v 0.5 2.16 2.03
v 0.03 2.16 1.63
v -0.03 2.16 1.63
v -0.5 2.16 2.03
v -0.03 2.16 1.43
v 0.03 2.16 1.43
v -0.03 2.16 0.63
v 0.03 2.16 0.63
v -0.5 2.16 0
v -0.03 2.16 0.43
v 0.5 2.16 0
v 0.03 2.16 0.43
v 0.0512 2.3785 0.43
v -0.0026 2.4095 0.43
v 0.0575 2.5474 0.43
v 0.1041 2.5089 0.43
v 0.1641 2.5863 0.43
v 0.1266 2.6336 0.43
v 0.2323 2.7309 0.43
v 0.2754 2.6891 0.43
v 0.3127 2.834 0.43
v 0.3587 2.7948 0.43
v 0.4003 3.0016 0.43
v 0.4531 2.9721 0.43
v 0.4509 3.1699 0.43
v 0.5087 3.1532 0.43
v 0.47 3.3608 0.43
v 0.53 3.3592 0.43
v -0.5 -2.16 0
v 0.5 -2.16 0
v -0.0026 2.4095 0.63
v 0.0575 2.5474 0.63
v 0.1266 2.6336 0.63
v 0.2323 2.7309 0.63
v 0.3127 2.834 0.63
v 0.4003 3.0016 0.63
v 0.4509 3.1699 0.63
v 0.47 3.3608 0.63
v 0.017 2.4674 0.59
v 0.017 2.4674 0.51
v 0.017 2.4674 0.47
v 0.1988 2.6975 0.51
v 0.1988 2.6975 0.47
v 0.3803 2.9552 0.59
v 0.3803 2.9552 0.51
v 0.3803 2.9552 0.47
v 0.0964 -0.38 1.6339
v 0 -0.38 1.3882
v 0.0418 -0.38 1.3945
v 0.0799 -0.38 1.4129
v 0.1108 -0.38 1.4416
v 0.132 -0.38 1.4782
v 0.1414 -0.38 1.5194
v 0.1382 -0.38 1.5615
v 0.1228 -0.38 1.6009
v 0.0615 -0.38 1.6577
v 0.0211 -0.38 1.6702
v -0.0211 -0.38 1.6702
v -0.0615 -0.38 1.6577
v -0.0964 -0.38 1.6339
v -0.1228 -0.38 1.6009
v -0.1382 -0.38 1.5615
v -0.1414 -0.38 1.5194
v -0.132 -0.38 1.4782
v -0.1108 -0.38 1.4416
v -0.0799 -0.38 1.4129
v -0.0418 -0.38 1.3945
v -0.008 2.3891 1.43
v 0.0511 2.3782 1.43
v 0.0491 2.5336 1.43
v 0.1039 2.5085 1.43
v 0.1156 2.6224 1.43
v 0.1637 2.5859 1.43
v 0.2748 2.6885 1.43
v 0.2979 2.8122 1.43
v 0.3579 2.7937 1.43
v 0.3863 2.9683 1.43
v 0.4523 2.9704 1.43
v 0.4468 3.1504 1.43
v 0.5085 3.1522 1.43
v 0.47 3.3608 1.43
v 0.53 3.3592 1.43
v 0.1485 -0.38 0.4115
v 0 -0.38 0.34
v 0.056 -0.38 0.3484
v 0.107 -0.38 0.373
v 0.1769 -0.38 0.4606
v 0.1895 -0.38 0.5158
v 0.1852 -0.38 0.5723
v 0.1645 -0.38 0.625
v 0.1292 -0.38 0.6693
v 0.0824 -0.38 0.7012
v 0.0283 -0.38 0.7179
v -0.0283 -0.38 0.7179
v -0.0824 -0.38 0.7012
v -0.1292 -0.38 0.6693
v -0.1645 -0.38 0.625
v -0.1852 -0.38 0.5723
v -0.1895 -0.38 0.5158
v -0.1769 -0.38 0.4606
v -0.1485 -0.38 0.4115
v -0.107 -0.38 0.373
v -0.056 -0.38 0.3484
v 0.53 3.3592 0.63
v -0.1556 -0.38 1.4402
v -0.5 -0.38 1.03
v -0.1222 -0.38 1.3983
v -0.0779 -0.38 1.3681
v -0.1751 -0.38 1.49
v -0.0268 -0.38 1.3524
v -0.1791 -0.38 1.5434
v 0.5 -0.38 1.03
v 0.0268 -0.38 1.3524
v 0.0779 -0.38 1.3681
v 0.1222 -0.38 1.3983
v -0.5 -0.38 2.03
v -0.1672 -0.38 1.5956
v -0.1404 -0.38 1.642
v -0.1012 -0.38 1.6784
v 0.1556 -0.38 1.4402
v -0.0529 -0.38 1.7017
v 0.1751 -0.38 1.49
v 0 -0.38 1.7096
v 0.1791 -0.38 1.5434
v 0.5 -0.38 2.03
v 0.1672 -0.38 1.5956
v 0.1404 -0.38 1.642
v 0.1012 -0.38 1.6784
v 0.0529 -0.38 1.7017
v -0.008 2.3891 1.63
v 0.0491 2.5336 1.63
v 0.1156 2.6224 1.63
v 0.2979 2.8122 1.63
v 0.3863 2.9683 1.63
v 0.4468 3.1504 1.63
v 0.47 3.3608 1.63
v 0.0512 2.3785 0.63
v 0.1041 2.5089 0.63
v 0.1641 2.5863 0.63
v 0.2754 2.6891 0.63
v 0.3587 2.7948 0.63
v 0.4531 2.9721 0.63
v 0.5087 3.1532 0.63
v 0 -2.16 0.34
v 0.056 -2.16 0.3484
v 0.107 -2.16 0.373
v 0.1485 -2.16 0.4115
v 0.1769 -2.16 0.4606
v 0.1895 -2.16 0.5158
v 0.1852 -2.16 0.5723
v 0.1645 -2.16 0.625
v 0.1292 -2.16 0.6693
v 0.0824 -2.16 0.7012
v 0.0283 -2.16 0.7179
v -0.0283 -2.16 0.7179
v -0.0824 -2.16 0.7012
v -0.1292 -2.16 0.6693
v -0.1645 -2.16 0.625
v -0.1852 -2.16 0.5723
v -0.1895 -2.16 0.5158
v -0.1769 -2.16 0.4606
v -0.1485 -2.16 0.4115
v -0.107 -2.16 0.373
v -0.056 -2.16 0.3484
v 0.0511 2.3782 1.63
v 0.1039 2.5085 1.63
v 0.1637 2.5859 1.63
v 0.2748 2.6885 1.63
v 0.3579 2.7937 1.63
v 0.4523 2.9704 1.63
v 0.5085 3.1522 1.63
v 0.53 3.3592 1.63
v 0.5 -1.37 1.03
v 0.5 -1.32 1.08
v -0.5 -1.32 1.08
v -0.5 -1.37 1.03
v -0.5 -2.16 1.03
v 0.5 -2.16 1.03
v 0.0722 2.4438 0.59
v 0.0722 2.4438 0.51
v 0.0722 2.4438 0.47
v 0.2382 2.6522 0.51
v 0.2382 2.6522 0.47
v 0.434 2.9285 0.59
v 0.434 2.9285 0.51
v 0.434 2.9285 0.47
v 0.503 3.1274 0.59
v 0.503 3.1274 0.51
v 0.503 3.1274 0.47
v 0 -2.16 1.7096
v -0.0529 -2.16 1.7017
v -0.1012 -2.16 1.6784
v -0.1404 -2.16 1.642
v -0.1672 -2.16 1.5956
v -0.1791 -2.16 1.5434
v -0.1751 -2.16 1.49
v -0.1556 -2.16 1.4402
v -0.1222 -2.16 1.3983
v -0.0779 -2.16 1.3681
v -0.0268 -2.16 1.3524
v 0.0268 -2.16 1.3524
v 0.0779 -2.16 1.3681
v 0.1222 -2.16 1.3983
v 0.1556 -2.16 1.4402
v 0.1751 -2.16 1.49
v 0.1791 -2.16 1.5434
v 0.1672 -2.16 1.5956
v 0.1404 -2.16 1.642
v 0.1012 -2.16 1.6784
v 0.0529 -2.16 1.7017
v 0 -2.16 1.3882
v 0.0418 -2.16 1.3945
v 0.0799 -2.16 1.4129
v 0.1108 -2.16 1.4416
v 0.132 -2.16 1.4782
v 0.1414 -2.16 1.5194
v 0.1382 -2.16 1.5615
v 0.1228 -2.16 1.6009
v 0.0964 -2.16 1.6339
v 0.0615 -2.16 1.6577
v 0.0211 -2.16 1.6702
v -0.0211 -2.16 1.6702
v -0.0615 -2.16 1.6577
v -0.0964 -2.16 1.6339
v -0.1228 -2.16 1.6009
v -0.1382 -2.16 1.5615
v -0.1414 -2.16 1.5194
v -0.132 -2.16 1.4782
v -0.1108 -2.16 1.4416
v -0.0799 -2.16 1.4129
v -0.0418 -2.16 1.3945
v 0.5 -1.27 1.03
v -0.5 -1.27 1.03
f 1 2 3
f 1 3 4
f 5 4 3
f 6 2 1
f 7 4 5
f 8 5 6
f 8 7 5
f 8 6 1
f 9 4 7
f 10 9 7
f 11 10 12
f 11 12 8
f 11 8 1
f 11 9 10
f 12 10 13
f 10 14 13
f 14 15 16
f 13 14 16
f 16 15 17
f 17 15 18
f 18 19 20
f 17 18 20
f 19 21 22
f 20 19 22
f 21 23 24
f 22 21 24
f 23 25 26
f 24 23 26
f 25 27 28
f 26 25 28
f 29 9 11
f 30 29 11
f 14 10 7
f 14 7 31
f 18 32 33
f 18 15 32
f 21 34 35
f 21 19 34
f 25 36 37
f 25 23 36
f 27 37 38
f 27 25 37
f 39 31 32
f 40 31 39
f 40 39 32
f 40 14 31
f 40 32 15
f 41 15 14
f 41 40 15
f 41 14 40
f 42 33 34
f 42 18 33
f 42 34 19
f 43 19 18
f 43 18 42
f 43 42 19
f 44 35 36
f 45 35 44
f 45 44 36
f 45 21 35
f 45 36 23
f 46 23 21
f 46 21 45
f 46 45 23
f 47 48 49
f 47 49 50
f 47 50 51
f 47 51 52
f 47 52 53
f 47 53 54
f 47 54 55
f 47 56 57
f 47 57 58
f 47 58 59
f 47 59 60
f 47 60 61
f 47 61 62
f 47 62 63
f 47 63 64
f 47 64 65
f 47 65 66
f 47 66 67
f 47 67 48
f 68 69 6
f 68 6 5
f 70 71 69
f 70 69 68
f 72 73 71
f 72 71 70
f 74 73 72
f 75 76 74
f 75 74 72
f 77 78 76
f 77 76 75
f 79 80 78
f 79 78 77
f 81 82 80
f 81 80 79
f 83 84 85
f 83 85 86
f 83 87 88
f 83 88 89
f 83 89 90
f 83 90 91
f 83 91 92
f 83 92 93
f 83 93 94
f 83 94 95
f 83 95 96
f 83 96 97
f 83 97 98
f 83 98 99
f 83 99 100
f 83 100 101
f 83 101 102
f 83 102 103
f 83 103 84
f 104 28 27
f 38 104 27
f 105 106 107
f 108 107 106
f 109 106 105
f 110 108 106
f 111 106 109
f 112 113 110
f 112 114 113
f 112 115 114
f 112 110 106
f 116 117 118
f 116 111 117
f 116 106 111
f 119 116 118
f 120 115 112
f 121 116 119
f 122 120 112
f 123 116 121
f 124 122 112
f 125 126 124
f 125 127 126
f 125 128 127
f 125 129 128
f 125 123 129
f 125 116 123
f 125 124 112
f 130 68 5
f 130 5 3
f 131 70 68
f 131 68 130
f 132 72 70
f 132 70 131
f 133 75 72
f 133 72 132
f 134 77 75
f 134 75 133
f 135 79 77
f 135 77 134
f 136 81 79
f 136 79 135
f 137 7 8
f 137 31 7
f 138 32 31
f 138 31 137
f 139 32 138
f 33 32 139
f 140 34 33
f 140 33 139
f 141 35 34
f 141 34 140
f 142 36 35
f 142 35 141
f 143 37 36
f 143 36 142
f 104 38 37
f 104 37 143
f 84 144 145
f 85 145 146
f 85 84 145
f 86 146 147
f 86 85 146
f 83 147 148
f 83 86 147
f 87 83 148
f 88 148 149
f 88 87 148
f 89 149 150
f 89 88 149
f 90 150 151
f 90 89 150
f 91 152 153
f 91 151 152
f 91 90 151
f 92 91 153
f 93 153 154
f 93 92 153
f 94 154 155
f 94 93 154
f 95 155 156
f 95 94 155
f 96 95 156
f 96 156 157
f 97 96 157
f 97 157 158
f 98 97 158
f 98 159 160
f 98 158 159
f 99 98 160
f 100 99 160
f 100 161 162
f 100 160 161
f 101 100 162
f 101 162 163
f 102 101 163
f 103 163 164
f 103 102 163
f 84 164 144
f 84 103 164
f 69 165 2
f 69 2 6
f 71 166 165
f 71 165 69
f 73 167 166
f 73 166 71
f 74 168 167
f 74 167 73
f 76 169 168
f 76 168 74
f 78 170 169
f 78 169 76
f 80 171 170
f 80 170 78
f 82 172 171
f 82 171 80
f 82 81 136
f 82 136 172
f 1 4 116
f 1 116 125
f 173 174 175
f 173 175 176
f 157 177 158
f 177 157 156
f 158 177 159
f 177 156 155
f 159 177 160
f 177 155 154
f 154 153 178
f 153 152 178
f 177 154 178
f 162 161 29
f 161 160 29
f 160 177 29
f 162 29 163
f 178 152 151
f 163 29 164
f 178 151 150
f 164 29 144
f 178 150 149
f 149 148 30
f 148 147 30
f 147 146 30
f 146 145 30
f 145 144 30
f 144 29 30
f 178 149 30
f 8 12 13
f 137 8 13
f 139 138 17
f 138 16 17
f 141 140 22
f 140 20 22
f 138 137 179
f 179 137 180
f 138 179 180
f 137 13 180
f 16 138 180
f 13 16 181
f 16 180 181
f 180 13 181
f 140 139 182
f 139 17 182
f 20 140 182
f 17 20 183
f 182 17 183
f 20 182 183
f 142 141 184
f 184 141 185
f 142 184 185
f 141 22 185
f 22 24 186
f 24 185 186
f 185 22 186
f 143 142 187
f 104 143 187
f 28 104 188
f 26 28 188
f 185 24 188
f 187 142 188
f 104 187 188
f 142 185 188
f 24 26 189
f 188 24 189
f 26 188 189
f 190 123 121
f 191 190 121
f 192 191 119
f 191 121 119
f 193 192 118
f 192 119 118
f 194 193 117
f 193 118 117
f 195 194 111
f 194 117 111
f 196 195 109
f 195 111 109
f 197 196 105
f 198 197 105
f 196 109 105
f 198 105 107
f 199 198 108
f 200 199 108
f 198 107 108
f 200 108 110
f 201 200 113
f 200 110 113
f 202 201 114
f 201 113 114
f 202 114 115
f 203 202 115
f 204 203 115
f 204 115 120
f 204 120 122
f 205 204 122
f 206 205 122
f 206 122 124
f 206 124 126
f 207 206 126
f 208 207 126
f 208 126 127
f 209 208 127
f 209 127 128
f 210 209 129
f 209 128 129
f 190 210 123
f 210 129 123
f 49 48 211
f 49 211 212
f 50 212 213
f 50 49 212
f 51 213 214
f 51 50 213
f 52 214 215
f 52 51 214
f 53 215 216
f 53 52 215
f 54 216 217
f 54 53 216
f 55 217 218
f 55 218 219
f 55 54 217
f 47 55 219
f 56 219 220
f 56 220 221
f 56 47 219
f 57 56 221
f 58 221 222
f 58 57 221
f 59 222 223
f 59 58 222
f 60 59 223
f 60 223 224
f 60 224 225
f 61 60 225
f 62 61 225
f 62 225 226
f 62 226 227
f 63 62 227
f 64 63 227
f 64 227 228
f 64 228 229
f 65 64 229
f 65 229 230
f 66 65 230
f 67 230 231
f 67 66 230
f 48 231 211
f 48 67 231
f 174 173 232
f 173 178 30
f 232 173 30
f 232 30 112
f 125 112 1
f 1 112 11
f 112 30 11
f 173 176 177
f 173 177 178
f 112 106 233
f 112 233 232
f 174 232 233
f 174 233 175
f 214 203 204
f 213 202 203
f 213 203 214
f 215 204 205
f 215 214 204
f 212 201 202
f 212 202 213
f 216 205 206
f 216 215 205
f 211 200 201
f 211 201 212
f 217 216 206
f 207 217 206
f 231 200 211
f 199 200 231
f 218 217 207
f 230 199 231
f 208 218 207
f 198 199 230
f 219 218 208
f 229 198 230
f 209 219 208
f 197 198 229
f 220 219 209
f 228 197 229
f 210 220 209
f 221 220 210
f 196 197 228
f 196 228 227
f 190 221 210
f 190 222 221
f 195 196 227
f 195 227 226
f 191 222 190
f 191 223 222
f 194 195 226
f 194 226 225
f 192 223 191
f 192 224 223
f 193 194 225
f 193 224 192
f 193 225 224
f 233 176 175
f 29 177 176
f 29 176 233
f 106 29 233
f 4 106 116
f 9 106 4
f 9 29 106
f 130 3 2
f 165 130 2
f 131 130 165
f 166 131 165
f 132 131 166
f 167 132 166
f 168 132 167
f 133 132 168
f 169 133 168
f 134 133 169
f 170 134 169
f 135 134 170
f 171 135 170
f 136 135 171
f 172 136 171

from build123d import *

# Parameters (mm, degrees)
SKETCH1_W           = 1
SKETCH1_H           = 4.32
BOSS_EXTRUDE1_DEPTH = 2.03
SKETCH2_W           = 1
SKETCH2_H           = 1.78
CUT_EXTRUDE1_DEPTH  = 1
SKETCH3_R           = 0.179640036
SKETCH3_R_2         = 0.141754664
BOSS_EXTRUDE2_DEPTH = 1.78
SKETCH3_3_R         = 0.19
CUT_EXTRUDE2_DEPTH  = 4.28975683
SKETCH7_W           = 0.06
SKETCH7_H           = 0.2
MIRROR1_START       = 0.43
MIRROR1_DEPTH       = 0.2
BOSS_EXTRUDE3_DEPTH = 1


with BuildPart() as part:
    # Sketch1 → Boss-Extrude1 (new body)
    with BuildSketch(Plane.XY):
        Rectangle(SKETCH1_W, SKETCH1_H)
    extrude(amount=BOSS_EXTRUDE1_DEPTH)

    # Sketch2 → Cut-Extrude1 (cut)
    with BuildSketch(Plane.XY.offset(2.03)):
        with Locations((0, -1.27)):
            Rectangle(SKETCH2_W, SKETCH2_H)
    extrude(amount=-CUT_EXTRUDE1_DEPTH, mode=Mode.SUBTRACT)

    # Sketch3 → Boss-Extrude2 (add)
    with BuildSketch(Plane.XZ.offset(0.38)):
        with Locations(Location((0, 1.53, 0), (0, 0, 90))):
            Circle(SKETCH3_R)
        with Locations(Location((0, 1.53, 0), (0, 0, 270))):
            Circle(SKETCH3_R_2, mode=Mode.SUBTRACT)
    extrude(amount=BOSS_EXTRUDE2_DEPTH)

    # Sketch3<3> → Cut-Extrude2 (cut, through all)
    with BuildSketch(Plane.XZ.offset(0.38)):
        with Locations(Location((0, 0.53, 0), (0, 0, 270))):
            Circle(SKETCH3_3_R)
    extrude(amount=CUT_EXTRUDE2_DEPTH, mode=Mode.SUBTRACT)

    # Sweep2: sweep along a path in Sketch6
    with BuildLine() as sweep2_path:  # in the path sketch's own coordinates; laid on its plane below (add() does not lay a ready-made edge on the line's plane)
        add(Edge.make_bspline(
            [(0, 2.16), (0.006618512, 2.413579092), (-0.099153844, 2.580707218), (-0.318669183, 2.747242888), (-0.5, 3.04153675), (-0.5, 3.36)],
            knots=[0, 0, 0, 0, 0.33988837, 0.43988837, 1, 1, 1, 1], degree=3))
    # Sketch7 → Sweep2 (sweep)
    with BuildSketch(Plane(origin=(0, 2.16, 0), x_dir=(1, 0, 0), z_dir=(0, 1, 0))):
        with Locations((0, -1.53)):
            Rectangle(SKETCH7_W, SKETCH7_H)
    sweep(path=Plane(origin=(0, 0, 1.53), x_dir=(-1, 0, 0), z_dir=(0, 0, -1)) * sweep2_path.line)

    # Mirror1: read off the stored shape, not the designer's step
    # Mirror1 outline → Mirror1 (add)
    with BuildSketch(Plane.XY.offset(MIRROR1_START)):
        with BuildLine():
            Line((-0.03, 2.16), (0.03, 2.16))
            add(Edge.make_bspline(
                [(0.03, 2.16), (0.026689237, 2.283494275), (0.044838373, 2.374836995), (0.09950353, 2.512679036), (0.135974255, 2.559401221), (0.192448919, 2.613751579), (0.214161718, 2.63024792), (0.305479678, 2.713719563), (0.377816112, 2.80815353), (0.490125853, 3.048840143), (0.529863619, 3.195099656), (0.529989787, 3.359217255)],
                knots=[0, 0, 0, 0, 0.169944185, 0.169944185, 0.33988837, 0.33988837, 0.43988837, 0.43988837, 0.719944185, 0.719944185, 1, 1, 1, 1], degree=3))
            Line((0.529989787, 3.359217255), (0.470010213, 3.360782745))
            add(Edge.make_bspline(
                [(-0.03, 2.16), (-0.033307725, 2.290084846), (-0.013902459, 2.390098952), (0.047964171, 2.544727536), (0.090471438, 2.599118005), (0.15508015, 2.660870348), (0.177270449, 2.677680388), (0.259162827, 2.752955531), (0.327574678, 2.841864618), (0.432943498, 3.068609235), (0.470136161, 3.2064371), (0.470010213, 3.360782745)],
                knots=[0, 0, 0, 0, 0.169944185, 0.169944185, 0.33988837, 0.33988837, 0.43988837, 0.43988837, 0.719944185, 0.719944185, 1, 1, 1, 1], degree=3))
        make_face()
    extrude(amount=MIRROR1_DEPTH)

    # Sketch8 → Boss-Extrude3 (add)
    with BuildSketch(Plane(origin=(0.5, 0, 0), x_dir=(0, 0, -1), z_dir=(1, 0, 0))):
        Polygon((-1.03, -1.27), (-1.08, -1.32), (-1.03, -1.37), align=None)
    extrude(amount=-BOSS_EXTRUDE3_DEPTH)


solid = part.part
